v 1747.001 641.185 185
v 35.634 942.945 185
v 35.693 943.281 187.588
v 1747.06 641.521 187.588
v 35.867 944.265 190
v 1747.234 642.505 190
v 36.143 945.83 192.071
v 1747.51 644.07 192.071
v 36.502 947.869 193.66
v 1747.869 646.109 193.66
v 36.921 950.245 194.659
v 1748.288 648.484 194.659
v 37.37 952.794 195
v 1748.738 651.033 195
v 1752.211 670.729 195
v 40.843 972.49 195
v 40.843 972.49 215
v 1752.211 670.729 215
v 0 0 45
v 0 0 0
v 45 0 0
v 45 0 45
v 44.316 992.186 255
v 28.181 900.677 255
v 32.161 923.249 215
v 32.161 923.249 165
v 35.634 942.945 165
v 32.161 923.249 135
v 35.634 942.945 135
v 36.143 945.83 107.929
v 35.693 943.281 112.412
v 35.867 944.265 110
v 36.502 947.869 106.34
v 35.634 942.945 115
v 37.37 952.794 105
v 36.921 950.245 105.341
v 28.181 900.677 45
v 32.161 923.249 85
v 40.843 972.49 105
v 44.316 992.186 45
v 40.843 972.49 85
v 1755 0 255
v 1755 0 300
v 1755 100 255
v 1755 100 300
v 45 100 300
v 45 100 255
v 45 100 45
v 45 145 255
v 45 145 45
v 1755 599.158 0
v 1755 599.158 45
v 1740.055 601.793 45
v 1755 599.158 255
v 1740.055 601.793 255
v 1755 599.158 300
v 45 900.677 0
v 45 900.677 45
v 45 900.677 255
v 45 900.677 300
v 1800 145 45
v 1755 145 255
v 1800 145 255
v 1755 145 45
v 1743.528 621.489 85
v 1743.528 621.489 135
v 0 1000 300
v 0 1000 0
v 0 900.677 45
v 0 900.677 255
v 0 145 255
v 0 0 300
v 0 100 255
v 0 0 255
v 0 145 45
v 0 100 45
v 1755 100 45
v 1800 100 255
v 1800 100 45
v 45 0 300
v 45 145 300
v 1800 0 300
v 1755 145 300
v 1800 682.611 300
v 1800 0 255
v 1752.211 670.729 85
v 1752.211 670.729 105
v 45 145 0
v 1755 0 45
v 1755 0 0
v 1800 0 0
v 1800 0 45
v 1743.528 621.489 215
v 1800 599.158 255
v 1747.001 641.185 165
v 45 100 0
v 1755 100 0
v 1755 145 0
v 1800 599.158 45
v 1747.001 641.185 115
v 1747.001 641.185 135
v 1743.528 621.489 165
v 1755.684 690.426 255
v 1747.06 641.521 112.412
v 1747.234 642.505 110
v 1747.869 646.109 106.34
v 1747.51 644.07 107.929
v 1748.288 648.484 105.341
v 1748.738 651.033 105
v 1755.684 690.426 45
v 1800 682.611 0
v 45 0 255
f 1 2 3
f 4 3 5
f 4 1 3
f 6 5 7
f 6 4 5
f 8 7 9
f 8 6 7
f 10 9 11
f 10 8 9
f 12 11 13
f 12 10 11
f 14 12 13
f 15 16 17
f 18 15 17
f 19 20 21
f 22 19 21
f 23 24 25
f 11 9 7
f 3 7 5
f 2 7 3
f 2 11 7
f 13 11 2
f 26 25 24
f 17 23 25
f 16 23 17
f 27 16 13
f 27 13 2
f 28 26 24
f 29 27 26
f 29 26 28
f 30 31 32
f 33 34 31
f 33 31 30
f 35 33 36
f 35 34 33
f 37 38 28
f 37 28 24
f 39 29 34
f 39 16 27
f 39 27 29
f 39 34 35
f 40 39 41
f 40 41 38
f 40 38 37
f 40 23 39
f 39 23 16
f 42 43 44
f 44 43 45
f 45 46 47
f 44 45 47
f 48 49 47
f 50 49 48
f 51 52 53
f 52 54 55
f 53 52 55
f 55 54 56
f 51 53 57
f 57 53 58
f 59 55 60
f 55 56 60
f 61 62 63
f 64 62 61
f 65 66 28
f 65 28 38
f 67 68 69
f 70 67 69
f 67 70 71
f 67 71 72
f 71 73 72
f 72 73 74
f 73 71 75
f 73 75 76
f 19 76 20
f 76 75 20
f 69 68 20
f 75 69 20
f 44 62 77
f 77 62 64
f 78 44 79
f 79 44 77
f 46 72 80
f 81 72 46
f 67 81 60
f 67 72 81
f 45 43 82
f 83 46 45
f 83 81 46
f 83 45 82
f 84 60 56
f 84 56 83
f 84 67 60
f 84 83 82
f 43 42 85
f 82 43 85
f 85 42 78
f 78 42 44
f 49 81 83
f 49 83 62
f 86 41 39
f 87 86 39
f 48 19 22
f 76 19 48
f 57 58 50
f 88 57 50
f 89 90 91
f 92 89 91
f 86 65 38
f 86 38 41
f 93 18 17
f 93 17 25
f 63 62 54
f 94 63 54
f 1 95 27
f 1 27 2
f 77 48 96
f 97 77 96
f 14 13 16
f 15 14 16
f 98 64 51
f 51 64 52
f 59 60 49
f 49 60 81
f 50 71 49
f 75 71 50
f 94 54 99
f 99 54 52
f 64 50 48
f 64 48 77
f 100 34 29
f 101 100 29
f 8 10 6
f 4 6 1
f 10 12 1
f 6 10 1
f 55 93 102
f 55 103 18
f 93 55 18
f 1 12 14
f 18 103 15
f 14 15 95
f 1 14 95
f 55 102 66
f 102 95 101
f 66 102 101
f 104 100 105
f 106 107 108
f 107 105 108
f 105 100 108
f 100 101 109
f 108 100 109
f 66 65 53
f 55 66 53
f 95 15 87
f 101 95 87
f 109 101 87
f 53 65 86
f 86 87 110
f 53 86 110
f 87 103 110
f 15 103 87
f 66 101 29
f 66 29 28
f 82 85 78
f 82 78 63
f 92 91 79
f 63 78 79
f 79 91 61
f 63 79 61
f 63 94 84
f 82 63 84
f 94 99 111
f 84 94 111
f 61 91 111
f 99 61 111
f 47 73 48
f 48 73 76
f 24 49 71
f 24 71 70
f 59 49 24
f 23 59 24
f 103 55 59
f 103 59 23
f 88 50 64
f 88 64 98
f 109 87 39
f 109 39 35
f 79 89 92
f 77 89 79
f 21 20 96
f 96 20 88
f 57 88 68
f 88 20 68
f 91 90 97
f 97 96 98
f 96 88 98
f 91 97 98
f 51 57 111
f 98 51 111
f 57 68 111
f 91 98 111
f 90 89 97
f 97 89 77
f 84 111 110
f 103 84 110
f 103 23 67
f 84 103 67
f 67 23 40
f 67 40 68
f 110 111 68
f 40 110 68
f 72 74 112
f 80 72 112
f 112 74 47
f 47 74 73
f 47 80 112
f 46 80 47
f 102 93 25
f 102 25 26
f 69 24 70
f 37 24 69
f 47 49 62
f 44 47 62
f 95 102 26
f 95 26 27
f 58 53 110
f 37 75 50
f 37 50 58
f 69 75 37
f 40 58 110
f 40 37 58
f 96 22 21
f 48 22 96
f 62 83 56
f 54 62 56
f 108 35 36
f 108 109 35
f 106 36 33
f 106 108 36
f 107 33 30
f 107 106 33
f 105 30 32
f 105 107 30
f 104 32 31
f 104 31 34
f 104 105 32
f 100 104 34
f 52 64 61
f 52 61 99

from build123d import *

# Parameters (mm, degrees)
RESSALTO_EXTRUS_O1_DEPTH = 300
ESBO_O2_W                = 1710
ESBO_O2_H                = 100
CORTE_EXTRUS_O1_DEPTH    = 300
CORTE_EXTRUS_O2_START    = -1800
ESBO_O3_W                = 210
ESBO_O3_H                = 454.157753787
ESBO_O3_H_2              = 100
CORTE_EXTRUS_O2_DEPTH    = 1800
ESBO_O4_W                = 1710
ESBO_O4_H                = 210
CORTE_EXTRUS_O3_DEPTH    = 45
ESBO_O5_W                = 210
ESBO_O5_H                = 301.519137011
CORTE_EXTRUS_O4_DEPTH    = 45
ESBO_O6_W                = 1737.767901394
ESBO_O6_H                = 210
CORTE_EXTRUS_O5_DEPTH    = 150
RESSALTO_EXTRUS_O2_DEPTH = 1737.767901394
FILETE1_R                = 10


with BuildPart() as part:
    # Esboço1 → Ressalto-extrusão1 (new body)
    with BuildSketch(Plane.XY):
        Polygon((0, 1000), (0, 0), (1800, 0), (1800, 682.611434725), align=None)
    extrude(amount=RESSALTO_EXTRUS_O1_DEPTH)

    # Esboço2 → Corte-extrusão1 (cut)
    with BuildSketch(Plane.XY.offset(300)):
        with Locations((900, 50)):
            Rectangle(ESBO_O2_W, ESBO_O2_H)
        Polygon((45, 900.676890798), (45, 145), (1755, 145), (1755, 599.157753787), align=None)
    extrude(amount=-CORTE_EXTRUS_O1_DEPTH, mode=Mode.SUBTRACT)

    # Esboço3 → Corte-extrusão2 (cut)
    with BuildSketch(Plane(origin=(1800, 0, 0), x_dir=(0, 0, -1), z_dir=(1, 0, 0)).offset(CORTE_EXTRUS_O2_START)):
        with Locations((-150, 372.078876894)):
            Rectangle(ESBO_O3_W, ESBO_O3_H)
        with Locations((-150, 50)):
            Rectangle(ESBO_O3_W, ESBO_O3_H_2)
    extrude(amount=CORTE_EXTRUS_O2_DEPTH, mode=Mode.SUBTRACT)

    # Esboço4 → Corte-extrusão3 (cut)
    with BuildSketch(Plane(origin=(0, 145, 0), x_dir=(1, 0, 0), z_dir=(0, 1, 0))):
        with Locations((900, -150)):
            Rectangle(ESBO_O4_W, ESBO_O4_H)
    extrude(amount=-CORTE_EXTRUS_O3_DEPTH, mode=Mode.SUBTRACT)

    # Esboço5 → Corte-extrusão4 (cut)
    with BuildSketch(Plane(origin=(45, 0, 0), x_dir=(0, 0, -1), z_dir=(1, 0, 0))):
        with Locations((-150, 749.917322293)):
            Rectangle(ESBO_O5_W, ESBO_O5_H)
    extrude(amount=-CORTE_EXTRUS_O4_DEPTH, mode=Mode.SUBTRACT)

    # Esboço6 → Corte-extrusão5 (cut)
    with BuildSketch(Plane(origin=(171.010071663, 969.846310393, 0), x_dir=(0.9848077530122075, -0.17364817766693394, 0), z_dir=(0.17364817766693397, 0.9848077530122076, 0))):
        with Locations((740.23577303, -150)):
            Rectangle(ESBO_O6_W, ESBO_O6_H)
    extrude(amount=-CORTE_EXTRUS_O5_DEPTH, mode=Mode.SUBTRACT)

    # Esboço8 → Ressalto-extrusão2 (add)
    with BuildSketch(Plane(origin=(-126.693722777, 22.339521612, 0), x_dir=(0, 0, -1), z_dir=(0.9848077530122076, -0.173648177666934, 0))):
        Polygon((-215, 964.807753012), (-215, 914.807753012), (-165, 914.807753012), (-165, 934.807753012), (-195, 934.807753012), (-195, 964.807753012), align=None)
        Polygon((-135, 914.807753012), (-85, 914.807753012), (-85, 964.807753012), (-105, 964.807753012), (-105, 934.807753012), (-135, 934.807753012), align=None)
    extrude(amount=RESSALTO_EXTRUS_O2_DEPTH)

    # Filete1
    filete1_edges = [part.edges().sort_by_distance(p)[0] for p in [
        (891.317591116, 792.065329712, 195),
        (891.317591116, 792.065329712, 105),
    ]]
    fillet(filete1_edges, radius=FILETE1_R)


solid = part.part
